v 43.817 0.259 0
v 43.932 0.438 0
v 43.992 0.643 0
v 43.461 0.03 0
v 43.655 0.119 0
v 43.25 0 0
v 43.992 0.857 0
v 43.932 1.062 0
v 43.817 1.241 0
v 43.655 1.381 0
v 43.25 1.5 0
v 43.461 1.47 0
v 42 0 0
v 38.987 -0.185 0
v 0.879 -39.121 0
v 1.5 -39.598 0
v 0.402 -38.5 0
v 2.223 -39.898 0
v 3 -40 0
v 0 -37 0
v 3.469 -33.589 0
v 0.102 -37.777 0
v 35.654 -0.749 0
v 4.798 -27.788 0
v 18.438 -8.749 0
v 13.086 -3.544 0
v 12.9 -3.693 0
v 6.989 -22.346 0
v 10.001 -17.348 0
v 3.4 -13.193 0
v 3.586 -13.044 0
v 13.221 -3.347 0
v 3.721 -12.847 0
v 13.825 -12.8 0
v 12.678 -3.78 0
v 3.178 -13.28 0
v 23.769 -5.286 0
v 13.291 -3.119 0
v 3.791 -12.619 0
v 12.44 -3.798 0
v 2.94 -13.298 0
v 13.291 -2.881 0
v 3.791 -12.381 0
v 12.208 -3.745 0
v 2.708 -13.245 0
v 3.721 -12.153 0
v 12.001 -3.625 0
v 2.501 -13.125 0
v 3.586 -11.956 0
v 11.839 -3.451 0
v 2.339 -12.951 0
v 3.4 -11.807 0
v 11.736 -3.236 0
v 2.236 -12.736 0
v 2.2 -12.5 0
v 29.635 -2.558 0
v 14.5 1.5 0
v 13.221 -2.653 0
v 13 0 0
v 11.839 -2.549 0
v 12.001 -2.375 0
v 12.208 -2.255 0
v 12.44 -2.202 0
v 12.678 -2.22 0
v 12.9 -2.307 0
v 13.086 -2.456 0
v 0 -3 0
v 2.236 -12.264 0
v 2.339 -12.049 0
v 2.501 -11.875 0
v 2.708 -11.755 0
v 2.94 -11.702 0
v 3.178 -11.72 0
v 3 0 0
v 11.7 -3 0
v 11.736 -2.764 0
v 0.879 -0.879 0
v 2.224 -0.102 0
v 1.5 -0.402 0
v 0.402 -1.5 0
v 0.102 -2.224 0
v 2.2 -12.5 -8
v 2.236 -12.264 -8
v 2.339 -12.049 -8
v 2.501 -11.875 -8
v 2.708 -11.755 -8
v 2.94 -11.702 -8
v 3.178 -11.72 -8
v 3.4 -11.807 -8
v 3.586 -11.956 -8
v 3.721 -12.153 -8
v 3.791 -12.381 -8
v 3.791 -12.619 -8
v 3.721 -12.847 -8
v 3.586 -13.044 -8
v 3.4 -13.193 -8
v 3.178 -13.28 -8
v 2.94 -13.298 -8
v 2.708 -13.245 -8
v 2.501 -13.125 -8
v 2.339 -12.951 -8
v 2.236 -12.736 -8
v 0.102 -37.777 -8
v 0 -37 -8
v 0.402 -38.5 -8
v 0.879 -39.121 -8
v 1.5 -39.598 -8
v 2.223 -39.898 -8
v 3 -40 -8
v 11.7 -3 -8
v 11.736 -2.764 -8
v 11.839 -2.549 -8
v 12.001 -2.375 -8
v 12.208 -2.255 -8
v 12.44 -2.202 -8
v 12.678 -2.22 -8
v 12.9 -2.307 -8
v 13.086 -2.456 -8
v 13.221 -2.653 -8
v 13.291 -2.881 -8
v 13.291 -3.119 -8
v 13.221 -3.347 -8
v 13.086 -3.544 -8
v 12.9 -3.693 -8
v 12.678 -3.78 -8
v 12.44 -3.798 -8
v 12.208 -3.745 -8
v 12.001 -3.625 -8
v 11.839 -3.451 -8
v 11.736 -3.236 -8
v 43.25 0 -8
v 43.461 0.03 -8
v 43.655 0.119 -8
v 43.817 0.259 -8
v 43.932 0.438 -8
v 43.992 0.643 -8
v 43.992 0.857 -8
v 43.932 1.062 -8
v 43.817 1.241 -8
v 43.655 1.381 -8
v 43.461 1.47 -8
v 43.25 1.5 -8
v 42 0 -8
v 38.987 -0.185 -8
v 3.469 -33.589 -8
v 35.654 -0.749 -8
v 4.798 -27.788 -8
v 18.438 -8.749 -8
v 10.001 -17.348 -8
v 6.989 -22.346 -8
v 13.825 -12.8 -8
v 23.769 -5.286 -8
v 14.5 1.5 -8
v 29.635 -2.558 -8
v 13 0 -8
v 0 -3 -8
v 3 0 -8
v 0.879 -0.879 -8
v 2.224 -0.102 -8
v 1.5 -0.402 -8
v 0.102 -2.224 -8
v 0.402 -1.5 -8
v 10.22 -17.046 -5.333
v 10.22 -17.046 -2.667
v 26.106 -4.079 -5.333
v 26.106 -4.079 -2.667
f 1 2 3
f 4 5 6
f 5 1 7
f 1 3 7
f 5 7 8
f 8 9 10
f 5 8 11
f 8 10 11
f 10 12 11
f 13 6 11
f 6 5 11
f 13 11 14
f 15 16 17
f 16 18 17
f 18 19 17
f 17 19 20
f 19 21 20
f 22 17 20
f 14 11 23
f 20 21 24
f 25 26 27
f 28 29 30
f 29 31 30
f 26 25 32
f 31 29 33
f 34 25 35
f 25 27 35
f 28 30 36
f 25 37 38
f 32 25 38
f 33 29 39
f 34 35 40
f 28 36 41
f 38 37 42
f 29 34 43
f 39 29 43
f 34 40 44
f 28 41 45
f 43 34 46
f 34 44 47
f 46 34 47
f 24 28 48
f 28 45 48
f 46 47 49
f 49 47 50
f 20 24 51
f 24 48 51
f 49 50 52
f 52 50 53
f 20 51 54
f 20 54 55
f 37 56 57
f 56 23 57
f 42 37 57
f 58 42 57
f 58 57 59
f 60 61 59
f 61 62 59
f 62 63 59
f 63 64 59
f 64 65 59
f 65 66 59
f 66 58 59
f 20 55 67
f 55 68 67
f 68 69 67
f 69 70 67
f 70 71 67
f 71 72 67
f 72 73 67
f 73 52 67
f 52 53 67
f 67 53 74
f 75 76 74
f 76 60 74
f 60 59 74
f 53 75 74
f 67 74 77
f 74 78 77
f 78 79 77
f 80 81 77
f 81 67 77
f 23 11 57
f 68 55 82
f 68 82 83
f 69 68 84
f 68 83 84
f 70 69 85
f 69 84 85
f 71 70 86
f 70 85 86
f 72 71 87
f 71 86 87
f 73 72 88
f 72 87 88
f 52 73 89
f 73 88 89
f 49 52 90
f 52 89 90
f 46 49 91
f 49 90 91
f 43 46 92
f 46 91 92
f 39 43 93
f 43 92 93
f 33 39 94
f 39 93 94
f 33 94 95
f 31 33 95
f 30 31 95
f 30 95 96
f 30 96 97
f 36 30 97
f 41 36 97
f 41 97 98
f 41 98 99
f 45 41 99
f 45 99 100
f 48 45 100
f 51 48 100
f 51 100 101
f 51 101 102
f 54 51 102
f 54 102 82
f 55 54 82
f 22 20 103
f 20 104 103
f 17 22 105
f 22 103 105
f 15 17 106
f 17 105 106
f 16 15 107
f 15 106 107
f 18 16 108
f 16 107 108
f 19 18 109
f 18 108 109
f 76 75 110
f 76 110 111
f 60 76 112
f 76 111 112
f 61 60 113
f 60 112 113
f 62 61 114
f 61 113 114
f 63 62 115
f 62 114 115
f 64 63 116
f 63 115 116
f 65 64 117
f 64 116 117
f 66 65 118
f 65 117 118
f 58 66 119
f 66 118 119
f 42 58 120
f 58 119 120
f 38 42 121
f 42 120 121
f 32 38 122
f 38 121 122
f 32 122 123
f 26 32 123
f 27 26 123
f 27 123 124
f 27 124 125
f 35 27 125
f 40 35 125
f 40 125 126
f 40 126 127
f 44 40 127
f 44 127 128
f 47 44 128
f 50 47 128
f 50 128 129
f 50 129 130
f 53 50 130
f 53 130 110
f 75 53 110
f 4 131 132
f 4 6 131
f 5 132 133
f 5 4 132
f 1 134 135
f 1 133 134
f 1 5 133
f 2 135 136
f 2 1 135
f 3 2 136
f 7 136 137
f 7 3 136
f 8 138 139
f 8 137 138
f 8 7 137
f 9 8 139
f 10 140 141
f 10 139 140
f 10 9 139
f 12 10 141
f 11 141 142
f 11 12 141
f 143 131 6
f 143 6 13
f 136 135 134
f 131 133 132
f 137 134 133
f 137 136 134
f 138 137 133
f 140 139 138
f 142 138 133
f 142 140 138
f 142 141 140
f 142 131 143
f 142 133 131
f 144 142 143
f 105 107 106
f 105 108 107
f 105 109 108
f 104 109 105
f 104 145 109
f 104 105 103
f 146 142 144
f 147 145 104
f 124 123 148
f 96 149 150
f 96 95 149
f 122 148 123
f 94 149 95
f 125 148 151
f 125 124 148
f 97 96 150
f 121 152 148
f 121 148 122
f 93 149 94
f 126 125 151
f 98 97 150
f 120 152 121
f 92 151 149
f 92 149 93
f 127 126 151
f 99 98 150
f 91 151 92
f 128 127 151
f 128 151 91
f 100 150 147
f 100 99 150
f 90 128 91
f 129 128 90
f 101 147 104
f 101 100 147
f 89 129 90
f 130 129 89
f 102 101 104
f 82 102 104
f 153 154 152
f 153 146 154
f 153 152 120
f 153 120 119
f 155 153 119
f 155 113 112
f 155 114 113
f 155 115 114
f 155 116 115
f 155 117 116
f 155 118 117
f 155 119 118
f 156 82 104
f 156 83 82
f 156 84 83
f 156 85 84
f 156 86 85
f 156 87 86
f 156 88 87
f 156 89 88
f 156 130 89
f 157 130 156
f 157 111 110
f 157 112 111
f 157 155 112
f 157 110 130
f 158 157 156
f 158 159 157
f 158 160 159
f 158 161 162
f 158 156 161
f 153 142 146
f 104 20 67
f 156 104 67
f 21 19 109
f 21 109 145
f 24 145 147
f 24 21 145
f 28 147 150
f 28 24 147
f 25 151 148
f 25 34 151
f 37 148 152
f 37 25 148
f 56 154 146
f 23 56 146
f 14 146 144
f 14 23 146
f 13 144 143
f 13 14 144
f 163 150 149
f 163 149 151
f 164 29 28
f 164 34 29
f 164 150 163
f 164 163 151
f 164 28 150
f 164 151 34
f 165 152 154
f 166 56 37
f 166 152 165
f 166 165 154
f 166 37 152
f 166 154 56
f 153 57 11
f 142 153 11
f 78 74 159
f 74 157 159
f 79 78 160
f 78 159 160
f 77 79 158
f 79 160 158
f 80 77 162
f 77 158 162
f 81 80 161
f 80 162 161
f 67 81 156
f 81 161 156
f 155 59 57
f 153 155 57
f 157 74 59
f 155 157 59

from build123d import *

# Parameters (mm, degrees)
EXTRUDE_641_DEPTH = 8
FILLET_2_R        = 3
FILLET_3_RADIUS   = 0.75
FILLET_3_LENGTH   = 8
HOLE_WIZARD_M2_D  = 1.6
FILLET_4_R        = 3


with BuildPart() as part:
    # Model → Extrude 641 (new body)
    with BuildSketch(Plane.XY):
        with BuildLine():
            Line((0, 0), (13, 0))
            Line((13, 0), (14.5, 1.5))
            Line((14.5, 1.5), (44, 1.5))
            Line((44, 1.5), (44, 0))
            Line((44, 0), (42, 0))
            add(Edge.make_bspline(
                [(3, -40), (3, -11.686704979), (28.988478702, 0), (42, 0)],
                knots=[0, 0, 0, 0, 0.938491694, 0.938491694, 0.938491694, 0.938491694], degree=3))
            Line((3, -40), (0, -40))
            Line((0, -40), (0, 0))
        make_face()
    extrude(amount=-EXTRUDE_641_DEPTH)

    # Скругление2
    fillet_2_edges = [part.edges().sort_by_distance(p)[0] for p in [
        (0, 0, -4),
    ]]
    fillet(fillet_2_edges, radius=FILLET_2_R)

    # Скругление3: full round fillet: the end face becomes a half cylinder, R = half its width
    fillet_3_face = Plane((44, 0.75, -4), x_dir=(0, 0, 1), z_dir=(1, 0, 0))  # on the end face: x along it, z out of the body
    fillet_3_slab = fillet_3_face.offset(-FILLET_3_RADIUS / 2) * Box(FILLET_3_LENGTH, 2 * FILLET_3_RADIUS, FILLET_3_RADIUS, mode=Mode.PRIVATE)  # the body's end, R deep
    fillet_3_round = Plane((43.25, 0.75, -4), x_dir=(1, 0, 0), z_dir=(0, 0, 1)) * Cylinder(FILLET_3_RADIUS, FILLET_3_LENGTH, mode=Mode.PRIVATE)  # its axis R under the face
    add(fillet_3_slab - fillet_3_round, mode=Mode.SUBTRACT)

    # Крепление M2 (through all)
    with Locations(Plane.XY):
        with Locations((3, -12.5), (12.5, -3)):
            Hole(HOLE_WIZARD_M2_D / 2)

    # Скругление4
    fillet_4_edges = [part.edges().sort_by_distance(p)[0] for p in [
        (0, -40, -4),
    ]]
    fillet(fillet_4_edges, radius=FILLET_4_R - 0.0001)  # a hair under: the kernel refuses the full size


solid = part.part
